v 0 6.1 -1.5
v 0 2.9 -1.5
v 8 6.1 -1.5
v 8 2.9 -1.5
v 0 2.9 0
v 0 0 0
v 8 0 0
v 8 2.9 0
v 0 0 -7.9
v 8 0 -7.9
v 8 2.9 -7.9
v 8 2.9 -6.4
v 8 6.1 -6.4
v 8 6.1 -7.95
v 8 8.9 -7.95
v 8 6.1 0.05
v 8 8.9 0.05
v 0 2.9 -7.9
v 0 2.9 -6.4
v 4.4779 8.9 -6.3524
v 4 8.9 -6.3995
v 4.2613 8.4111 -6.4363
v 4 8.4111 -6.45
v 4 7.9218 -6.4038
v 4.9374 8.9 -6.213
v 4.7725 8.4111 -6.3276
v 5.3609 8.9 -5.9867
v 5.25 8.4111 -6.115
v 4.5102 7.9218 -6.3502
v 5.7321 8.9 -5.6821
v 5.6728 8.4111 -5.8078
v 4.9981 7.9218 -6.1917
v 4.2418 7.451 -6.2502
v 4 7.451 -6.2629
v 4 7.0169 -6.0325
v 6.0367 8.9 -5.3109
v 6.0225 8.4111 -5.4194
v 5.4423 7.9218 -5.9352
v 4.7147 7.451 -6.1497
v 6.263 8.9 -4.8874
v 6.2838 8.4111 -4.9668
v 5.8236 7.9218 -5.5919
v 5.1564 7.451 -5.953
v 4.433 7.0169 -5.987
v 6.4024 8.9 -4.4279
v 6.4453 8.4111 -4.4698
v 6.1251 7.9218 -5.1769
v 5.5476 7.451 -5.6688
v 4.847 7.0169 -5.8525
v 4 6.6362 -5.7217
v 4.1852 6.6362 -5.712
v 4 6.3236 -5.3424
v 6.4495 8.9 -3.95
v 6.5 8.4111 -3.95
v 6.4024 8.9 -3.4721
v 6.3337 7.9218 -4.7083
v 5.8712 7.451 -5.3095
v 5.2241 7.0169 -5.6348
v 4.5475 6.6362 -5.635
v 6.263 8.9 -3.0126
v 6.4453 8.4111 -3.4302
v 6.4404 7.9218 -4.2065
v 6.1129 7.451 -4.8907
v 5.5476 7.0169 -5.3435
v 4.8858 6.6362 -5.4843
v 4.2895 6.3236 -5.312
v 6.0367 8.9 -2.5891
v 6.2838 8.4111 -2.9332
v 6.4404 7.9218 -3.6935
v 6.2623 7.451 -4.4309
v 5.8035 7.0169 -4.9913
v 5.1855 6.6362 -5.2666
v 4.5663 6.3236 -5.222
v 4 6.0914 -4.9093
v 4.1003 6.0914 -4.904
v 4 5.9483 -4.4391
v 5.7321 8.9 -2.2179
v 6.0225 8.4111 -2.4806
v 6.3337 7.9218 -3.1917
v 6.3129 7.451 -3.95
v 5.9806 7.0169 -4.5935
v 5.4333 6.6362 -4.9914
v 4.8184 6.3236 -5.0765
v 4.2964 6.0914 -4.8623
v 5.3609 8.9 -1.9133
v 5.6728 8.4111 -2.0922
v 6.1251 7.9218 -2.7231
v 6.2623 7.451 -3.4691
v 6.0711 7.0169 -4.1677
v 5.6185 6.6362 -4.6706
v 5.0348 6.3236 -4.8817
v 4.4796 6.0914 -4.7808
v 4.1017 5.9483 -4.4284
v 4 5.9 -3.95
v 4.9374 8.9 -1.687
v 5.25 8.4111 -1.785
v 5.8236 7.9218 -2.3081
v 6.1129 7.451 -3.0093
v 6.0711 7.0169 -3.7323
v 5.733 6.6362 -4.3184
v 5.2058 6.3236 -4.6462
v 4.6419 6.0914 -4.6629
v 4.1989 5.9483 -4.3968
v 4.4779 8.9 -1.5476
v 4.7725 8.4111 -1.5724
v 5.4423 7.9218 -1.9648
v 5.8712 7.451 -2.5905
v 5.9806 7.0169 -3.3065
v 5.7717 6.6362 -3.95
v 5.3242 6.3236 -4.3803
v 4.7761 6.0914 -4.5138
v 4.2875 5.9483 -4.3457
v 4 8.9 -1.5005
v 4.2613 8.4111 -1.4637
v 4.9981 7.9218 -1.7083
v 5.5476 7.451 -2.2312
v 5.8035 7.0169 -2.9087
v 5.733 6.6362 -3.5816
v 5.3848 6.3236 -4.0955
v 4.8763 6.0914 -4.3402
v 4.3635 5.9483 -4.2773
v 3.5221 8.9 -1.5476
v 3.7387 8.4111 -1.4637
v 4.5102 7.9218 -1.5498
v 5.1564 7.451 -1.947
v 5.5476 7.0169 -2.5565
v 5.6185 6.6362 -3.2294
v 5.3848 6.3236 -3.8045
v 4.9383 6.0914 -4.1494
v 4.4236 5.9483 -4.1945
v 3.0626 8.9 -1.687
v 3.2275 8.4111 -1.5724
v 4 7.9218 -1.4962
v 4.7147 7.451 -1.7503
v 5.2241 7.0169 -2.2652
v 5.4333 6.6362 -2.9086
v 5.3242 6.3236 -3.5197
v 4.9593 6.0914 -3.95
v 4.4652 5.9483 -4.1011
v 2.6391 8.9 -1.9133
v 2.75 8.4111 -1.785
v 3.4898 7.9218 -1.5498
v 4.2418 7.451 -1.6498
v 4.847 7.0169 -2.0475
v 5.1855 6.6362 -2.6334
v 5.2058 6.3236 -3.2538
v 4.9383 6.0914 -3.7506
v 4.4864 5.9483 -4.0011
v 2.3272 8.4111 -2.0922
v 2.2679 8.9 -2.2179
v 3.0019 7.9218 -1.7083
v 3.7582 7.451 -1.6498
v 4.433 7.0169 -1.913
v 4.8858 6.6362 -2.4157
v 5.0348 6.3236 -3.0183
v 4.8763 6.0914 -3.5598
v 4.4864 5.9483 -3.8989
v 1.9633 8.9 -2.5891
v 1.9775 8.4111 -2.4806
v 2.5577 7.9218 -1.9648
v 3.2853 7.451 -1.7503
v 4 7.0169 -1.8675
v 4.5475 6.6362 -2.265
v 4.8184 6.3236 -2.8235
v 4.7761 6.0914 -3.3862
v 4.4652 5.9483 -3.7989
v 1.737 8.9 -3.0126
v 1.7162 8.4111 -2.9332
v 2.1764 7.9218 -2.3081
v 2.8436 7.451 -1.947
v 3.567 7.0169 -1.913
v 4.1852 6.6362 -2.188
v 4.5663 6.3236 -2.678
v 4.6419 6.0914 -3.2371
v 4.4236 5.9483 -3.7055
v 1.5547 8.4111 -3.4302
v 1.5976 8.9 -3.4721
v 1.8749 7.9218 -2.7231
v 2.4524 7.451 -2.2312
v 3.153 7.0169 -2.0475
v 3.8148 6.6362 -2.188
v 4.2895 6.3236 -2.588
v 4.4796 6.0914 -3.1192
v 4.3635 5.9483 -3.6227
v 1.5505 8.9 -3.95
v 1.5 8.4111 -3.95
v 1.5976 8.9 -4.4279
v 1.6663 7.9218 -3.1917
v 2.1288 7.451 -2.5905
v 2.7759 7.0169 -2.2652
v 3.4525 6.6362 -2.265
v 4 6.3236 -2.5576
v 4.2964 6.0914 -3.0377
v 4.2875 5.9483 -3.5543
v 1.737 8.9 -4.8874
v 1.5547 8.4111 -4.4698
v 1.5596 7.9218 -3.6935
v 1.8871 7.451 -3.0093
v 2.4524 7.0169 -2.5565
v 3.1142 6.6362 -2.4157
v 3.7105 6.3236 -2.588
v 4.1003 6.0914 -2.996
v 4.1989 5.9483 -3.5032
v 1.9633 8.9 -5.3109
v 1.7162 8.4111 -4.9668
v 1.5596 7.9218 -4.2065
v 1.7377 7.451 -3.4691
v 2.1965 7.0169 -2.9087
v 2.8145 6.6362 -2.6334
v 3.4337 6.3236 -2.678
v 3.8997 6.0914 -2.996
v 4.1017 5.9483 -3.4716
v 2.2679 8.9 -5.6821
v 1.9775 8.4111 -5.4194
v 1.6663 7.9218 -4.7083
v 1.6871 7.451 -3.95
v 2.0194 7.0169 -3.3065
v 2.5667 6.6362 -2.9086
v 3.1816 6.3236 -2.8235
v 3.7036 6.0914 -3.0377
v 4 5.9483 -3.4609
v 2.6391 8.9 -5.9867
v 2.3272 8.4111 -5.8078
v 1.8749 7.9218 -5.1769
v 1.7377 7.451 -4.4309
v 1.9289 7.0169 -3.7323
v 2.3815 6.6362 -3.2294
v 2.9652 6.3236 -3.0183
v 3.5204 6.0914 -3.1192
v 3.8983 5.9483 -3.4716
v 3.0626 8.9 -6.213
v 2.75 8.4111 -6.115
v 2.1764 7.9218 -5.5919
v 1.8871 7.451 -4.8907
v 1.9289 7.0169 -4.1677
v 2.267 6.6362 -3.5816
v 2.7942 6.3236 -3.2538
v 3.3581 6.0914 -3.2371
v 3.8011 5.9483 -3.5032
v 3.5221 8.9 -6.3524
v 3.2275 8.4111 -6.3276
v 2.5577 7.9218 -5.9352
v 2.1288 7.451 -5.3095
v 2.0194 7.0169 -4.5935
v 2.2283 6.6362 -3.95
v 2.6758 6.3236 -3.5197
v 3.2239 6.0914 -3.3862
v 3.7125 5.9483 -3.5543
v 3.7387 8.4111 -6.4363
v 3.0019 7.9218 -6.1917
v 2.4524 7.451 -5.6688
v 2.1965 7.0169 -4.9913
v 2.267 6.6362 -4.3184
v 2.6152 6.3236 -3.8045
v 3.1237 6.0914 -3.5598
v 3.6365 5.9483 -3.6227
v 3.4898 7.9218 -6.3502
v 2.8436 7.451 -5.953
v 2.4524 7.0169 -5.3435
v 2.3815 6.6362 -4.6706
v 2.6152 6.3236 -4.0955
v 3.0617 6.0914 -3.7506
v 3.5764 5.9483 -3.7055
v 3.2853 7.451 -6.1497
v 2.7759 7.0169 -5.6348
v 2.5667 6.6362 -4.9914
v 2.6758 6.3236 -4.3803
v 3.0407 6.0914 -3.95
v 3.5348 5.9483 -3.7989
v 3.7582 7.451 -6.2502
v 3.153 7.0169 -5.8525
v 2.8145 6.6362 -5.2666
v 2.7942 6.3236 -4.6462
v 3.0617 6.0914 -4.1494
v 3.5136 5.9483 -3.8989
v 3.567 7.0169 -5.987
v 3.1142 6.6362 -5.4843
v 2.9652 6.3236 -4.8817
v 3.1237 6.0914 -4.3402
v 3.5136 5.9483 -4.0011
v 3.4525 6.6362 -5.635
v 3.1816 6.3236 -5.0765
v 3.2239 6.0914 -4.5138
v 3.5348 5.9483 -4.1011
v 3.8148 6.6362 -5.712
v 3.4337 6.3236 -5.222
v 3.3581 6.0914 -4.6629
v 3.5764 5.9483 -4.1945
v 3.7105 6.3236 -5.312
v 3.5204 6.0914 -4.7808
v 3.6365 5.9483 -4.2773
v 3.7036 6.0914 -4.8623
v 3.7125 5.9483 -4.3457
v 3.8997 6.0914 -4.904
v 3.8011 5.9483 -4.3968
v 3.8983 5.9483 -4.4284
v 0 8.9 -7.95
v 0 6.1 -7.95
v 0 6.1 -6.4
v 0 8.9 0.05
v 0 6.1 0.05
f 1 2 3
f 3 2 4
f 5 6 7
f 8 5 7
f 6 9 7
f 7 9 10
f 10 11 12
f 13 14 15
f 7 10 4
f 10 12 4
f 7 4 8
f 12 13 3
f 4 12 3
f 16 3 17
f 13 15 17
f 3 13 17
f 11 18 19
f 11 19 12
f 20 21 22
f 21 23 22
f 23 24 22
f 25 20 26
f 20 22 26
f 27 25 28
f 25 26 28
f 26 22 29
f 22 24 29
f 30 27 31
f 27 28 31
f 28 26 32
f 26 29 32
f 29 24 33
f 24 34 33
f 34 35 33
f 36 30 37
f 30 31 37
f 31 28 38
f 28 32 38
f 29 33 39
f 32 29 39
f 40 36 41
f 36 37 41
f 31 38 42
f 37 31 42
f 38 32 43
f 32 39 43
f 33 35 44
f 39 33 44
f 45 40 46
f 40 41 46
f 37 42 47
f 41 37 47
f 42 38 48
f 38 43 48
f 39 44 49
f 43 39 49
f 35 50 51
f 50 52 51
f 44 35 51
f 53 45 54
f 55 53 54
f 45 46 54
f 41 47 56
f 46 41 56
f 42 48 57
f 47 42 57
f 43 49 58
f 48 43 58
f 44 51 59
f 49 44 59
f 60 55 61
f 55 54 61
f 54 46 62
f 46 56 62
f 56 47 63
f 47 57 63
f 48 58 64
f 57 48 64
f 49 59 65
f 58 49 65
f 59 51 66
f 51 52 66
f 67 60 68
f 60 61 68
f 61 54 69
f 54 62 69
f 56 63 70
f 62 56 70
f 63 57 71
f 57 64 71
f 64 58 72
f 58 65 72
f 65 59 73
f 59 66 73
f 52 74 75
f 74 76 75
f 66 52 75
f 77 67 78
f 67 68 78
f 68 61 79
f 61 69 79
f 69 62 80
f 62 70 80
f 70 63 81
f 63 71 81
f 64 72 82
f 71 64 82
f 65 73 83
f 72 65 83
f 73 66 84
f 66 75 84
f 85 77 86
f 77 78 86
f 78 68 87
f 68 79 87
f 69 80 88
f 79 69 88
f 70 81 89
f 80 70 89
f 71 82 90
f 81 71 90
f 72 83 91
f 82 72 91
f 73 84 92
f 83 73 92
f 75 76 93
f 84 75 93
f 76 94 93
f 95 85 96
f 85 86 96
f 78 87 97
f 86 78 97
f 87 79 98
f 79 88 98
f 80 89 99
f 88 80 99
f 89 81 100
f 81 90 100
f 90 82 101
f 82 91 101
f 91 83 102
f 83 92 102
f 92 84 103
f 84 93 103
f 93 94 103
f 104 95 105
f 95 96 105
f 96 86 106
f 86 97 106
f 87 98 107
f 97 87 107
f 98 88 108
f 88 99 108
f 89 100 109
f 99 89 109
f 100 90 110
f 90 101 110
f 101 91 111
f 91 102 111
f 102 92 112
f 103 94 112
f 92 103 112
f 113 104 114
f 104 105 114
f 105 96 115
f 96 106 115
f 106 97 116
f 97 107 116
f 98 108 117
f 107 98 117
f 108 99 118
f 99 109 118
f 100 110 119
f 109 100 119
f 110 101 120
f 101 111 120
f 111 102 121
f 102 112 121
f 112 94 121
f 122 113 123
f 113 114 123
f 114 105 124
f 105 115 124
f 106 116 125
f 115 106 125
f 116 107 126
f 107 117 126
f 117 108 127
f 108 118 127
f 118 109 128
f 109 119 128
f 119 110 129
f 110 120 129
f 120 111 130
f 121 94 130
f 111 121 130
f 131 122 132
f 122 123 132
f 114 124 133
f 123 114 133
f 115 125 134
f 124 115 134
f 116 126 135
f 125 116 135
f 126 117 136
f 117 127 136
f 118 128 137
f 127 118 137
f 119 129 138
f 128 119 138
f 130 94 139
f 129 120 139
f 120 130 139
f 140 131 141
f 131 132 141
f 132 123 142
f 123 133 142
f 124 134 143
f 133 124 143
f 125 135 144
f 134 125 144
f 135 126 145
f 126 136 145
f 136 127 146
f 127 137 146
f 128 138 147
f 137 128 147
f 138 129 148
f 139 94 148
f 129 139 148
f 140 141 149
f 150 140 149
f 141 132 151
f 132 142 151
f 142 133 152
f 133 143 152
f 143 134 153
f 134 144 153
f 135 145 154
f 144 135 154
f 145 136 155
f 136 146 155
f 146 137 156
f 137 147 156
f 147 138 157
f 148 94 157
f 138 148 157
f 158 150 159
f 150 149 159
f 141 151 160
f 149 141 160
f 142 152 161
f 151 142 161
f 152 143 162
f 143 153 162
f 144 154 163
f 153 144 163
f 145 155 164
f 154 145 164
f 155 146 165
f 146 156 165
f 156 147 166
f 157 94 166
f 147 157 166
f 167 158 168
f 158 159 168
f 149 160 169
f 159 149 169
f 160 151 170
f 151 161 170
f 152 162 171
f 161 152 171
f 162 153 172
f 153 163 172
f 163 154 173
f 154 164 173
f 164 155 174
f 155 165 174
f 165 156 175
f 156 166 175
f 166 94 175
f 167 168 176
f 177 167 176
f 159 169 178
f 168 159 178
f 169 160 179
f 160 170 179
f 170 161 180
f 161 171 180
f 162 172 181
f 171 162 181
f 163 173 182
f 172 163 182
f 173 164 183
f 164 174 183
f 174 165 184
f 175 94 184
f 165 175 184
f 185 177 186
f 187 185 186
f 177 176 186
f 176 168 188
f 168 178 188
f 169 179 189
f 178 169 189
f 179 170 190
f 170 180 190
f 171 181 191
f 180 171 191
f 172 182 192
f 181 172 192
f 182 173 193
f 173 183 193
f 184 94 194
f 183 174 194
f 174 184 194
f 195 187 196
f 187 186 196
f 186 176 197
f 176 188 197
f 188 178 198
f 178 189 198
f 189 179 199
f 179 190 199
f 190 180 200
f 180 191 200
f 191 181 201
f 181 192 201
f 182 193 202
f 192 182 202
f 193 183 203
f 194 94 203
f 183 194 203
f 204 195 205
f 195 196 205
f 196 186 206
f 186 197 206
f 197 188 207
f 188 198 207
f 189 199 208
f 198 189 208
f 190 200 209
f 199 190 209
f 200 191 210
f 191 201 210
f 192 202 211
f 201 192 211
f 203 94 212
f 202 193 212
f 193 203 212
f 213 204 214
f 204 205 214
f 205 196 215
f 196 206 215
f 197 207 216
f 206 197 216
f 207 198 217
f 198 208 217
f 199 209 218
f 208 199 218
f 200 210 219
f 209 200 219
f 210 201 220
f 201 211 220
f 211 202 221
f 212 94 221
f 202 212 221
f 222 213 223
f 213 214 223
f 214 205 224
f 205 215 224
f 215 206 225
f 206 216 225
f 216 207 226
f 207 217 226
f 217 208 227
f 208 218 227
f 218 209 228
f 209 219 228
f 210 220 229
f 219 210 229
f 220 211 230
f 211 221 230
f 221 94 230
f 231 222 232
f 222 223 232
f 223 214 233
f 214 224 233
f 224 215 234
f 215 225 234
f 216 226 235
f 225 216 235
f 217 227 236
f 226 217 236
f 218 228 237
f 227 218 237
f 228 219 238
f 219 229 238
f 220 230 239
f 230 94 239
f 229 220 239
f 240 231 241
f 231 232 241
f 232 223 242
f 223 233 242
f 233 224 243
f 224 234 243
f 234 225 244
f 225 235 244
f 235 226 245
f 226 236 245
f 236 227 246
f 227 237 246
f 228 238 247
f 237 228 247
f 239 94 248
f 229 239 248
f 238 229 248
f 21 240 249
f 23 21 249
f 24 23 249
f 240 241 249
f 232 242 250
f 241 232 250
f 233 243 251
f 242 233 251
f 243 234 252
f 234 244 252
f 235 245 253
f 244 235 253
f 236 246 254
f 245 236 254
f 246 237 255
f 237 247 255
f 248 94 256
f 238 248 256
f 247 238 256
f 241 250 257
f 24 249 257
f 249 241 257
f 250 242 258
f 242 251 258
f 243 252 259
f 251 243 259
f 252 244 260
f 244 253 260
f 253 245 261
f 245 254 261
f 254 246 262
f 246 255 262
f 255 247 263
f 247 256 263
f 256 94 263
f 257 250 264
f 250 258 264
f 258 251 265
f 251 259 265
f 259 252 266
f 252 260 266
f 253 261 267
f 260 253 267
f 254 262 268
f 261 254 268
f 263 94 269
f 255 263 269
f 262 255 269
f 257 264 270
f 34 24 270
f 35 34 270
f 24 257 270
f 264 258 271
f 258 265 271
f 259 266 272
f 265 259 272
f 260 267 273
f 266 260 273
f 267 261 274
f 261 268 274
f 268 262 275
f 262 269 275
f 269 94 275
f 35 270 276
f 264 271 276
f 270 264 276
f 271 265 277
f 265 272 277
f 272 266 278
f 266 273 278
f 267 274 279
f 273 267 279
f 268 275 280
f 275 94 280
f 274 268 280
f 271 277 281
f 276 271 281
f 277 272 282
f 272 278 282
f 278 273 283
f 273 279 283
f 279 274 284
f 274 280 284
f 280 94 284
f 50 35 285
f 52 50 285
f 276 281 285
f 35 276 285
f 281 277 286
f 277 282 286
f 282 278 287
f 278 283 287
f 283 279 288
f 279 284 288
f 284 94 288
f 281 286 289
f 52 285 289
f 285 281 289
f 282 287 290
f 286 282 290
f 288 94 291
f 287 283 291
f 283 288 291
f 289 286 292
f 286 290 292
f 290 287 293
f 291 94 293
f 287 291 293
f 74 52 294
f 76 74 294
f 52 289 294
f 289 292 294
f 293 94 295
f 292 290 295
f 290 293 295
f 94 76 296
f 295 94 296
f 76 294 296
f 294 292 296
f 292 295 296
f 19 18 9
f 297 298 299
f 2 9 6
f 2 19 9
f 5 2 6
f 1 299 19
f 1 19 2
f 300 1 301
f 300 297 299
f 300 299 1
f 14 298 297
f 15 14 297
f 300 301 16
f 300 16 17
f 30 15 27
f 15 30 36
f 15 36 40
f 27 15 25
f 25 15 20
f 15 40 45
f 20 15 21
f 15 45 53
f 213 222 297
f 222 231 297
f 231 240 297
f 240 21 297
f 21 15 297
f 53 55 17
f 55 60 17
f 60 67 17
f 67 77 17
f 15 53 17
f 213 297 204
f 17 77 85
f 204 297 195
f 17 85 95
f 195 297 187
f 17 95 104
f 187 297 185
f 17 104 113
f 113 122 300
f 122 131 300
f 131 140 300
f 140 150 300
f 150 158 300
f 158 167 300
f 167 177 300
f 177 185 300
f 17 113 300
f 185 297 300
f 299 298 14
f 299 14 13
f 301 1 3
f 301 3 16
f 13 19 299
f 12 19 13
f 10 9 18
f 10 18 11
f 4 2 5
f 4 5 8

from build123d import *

# Parameters (mm, degrees)
SKETCH1_W           = 8
SKETCH1_H           = 7.9
BOSS_EXTRUDE1_DEPTH = 2.9
SKETCH2_W           = 8
SKETCH2_H           = 4.9
BOSS_EXTRUDE2_DEPTH = 6
SKETCH4_W           = 8
SKETCH4_H           = 2.8
BOSS_EXTRUDE3_DEPTH = 8


with BuildPart() as part:
    # Sketch1 → Boss-Extrude1 (new body)
    with BuildSketch(Plane(origin=(0, 0, 0), x_dir=(1, 0, 0), z_dir=(0, 1, 0))):
        with Locations((4, 3.95)):
            Rectangle(SKETCH1_W, SKETCH1_H)
    extrude(amount=BOSS_EXTRUDE1_DEPTH)

    # Sketch2 → Boss-Extrude2 (add)
    with BuildSketch(Plane(origin=(0, 2.9, 0), x_dir=(1, 0, 0), z_dir=(0, 1, 0))):
        with Locations((4, 3.95)):
            Rectangle(SKETCH2_W, SKETCH2_H)
    extrude(amount=BOSS_EXTRUDE2_DEPTH)

    # Sketch4 → Boss-Extrude3 (add, through all)
    with BuildSketch(Plane.ZY):
        with Locations((-3.95, 7.5)):
            Rectangle(SKETCH4_W, SKETCH4_H)
    extrude(amount=-BOSS_EXTRUDE3_DEPTH)

    # Sketch3 → Cut-Revolve2 (revolve, cut)
    with BuildSketch(Plane.ZY.offset(-4)):
        with BuildLine():
            Line((-3.95, 8.9), (-6.399489743, 8.9))
            ThreePointArc((-6.399489743, 8.9), (-5.886491673, 6.81886117), (-3.95, 5.9))
            Line((-3.95, 5.9), (-3.95, 8.9))
        make_face()
    revolve(axis=Axis((4, 8.9, -3.95), (0, -1, 0)), mode=Mode.SUBTRACT)


solid = part.part
